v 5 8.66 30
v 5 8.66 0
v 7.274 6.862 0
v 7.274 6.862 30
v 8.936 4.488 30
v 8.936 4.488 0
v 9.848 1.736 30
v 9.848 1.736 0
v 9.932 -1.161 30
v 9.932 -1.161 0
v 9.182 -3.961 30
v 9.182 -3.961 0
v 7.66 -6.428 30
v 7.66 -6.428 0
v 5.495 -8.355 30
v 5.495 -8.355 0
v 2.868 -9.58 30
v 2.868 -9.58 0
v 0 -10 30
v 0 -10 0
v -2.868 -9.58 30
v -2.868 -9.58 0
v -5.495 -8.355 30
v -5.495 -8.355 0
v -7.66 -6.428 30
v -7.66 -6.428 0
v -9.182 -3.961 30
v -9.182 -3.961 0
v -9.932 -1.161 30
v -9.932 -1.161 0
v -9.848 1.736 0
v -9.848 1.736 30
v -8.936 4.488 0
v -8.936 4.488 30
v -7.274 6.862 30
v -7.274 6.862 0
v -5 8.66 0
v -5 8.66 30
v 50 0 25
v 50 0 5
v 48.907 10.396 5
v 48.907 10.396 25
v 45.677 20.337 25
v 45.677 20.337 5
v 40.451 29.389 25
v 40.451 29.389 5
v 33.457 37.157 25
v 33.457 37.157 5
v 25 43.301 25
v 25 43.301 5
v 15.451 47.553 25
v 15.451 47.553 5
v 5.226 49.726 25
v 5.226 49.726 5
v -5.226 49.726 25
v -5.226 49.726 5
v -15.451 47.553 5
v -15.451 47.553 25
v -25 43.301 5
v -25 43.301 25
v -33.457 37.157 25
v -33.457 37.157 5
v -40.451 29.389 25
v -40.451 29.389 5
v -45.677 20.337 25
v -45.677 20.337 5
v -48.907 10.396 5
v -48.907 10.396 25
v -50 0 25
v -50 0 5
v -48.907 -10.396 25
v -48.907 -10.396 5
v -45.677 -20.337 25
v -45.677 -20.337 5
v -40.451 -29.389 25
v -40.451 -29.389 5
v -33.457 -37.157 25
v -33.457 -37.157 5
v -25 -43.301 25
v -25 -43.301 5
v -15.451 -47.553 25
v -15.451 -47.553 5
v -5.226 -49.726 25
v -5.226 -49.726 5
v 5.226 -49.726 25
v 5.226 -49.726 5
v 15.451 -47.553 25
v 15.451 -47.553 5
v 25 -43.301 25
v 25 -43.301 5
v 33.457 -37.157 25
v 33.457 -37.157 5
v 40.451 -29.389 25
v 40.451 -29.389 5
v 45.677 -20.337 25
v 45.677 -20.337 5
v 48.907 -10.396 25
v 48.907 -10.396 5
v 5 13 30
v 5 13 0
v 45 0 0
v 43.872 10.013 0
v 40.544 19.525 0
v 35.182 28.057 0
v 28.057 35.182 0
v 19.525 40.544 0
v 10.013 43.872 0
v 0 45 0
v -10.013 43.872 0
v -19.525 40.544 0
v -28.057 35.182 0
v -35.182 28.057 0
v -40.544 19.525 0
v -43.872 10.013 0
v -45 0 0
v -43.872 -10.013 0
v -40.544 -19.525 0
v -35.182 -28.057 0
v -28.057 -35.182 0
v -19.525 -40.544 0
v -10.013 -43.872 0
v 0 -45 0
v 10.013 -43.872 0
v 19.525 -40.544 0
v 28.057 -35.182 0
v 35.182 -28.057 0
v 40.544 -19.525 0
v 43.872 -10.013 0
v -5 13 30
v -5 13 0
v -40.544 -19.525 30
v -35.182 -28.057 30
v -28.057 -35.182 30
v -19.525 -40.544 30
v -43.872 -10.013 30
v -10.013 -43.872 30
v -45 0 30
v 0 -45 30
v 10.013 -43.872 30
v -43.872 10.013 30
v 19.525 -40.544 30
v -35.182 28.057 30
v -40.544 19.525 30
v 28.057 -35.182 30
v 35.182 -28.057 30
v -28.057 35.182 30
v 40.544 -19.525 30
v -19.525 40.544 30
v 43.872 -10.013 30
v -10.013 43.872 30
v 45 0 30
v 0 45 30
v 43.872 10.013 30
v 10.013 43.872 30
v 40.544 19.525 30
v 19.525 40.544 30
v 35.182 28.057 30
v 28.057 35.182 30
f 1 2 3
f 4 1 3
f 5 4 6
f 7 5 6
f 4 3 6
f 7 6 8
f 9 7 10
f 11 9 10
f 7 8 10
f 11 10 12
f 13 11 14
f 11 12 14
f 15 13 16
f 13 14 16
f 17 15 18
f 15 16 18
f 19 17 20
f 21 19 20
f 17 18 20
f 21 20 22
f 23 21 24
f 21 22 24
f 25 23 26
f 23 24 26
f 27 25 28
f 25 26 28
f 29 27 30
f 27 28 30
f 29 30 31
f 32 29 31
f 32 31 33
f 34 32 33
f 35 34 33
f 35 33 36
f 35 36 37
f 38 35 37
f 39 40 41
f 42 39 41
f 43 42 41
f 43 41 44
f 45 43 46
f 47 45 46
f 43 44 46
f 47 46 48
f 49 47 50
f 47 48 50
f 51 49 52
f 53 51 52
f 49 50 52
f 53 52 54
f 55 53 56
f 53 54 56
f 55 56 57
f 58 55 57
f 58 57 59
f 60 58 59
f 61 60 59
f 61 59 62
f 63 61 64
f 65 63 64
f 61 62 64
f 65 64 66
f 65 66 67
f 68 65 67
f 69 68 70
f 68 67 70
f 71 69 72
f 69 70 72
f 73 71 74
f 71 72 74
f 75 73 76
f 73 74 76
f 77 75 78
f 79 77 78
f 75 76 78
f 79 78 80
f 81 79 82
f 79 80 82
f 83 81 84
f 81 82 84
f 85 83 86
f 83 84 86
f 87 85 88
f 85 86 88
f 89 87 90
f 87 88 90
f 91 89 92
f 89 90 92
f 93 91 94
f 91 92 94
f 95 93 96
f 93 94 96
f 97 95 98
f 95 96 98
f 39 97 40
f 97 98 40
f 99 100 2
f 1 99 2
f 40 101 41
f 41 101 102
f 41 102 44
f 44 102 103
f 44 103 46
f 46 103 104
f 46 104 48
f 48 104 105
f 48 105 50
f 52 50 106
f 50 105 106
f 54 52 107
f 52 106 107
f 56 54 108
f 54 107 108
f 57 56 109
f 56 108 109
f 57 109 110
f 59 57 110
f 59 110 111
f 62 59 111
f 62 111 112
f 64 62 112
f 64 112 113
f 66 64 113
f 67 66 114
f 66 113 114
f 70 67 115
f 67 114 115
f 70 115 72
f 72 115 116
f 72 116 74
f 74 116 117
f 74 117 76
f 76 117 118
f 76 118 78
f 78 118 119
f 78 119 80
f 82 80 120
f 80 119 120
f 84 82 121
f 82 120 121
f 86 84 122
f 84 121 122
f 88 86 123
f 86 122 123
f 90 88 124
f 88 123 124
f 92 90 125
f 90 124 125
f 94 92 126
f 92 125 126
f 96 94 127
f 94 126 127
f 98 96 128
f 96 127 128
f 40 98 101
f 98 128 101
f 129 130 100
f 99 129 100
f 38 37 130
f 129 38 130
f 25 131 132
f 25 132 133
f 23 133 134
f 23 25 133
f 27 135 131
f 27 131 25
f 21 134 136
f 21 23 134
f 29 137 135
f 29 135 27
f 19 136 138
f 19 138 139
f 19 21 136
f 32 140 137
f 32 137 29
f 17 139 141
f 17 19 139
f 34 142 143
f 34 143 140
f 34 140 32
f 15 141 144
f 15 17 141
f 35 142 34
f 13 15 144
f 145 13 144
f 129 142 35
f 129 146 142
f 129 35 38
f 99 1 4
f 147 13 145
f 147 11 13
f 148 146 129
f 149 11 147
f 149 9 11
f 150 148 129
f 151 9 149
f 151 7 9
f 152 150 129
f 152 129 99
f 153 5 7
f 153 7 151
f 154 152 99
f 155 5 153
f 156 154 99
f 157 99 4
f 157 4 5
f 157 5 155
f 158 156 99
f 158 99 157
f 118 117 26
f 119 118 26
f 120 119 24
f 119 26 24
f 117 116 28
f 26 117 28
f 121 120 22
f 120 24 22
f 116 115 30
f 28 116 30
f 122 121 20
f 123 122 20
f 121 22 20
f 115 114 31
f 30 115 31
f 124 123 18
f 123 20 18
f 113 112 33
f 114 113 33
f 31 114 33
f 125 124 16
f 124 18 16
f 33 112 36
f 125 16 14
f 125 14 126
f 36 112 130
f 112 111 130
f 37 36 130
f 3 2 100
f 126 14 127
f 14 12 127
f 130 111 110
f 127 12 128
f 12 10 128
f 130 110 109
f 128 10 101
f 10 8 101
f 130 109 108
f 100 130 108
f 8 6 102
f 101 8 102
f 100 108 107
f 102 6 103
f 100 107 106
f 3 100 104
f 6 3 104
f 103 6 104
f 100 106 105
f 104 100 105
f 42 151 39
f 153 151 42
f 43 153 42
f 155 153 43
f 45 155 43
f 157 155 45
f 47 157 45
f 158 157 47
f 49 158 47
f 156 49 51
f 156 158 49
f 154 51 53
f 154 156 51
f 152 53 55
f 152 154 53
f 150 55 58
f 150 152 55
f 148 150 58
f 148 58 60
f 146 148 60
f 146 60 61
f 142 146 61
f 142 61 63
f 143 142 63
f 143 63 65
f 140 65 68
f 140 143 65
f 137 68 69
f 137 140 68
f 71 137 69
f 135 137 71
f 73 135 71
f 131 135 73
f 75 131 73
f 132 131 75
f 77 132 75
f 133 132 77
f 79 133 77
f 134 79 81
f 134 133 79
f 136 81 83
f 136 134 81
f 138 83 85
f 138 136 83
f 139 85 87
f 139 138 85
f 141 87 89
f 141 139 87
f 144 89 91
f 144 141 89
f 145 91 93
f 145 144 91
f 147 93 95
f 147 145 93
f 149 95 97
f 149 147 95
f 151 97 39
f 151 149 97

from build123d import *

# Parameters (mm, degrees)
F0_R     = 50
F1_DEPTH = 30
F2_SIZE  = 5


with BuildPart() as f1:
    # F0 (on Top) → F1 (new body)
    with BuildSketch(Plane.XY):
        Circle(F0_R)
        with BuildLine():
            ThreePointArc((5, 8.660254), (0, -10), (-5, 8.660254))
            Line((-5, 8.660254), (-5, 13))
            Line((-5, 13), (0, 13))
            Line((0, 13), (5, 13))
            Line((5, 13), (5, 8.660254))
        make_face(mode=Mode.SUBTRACT)
    extrude(amount=F1_DEPTH)

    # F2
    f2_edges = [f1.edges().sort_by_distance(p)[0] for p in [
        (-50, 0, 30),
        (-50, 0, 0),
    ]]
    chamfer(f2_edges, length=F2_SIZE)


solid = f1.part
